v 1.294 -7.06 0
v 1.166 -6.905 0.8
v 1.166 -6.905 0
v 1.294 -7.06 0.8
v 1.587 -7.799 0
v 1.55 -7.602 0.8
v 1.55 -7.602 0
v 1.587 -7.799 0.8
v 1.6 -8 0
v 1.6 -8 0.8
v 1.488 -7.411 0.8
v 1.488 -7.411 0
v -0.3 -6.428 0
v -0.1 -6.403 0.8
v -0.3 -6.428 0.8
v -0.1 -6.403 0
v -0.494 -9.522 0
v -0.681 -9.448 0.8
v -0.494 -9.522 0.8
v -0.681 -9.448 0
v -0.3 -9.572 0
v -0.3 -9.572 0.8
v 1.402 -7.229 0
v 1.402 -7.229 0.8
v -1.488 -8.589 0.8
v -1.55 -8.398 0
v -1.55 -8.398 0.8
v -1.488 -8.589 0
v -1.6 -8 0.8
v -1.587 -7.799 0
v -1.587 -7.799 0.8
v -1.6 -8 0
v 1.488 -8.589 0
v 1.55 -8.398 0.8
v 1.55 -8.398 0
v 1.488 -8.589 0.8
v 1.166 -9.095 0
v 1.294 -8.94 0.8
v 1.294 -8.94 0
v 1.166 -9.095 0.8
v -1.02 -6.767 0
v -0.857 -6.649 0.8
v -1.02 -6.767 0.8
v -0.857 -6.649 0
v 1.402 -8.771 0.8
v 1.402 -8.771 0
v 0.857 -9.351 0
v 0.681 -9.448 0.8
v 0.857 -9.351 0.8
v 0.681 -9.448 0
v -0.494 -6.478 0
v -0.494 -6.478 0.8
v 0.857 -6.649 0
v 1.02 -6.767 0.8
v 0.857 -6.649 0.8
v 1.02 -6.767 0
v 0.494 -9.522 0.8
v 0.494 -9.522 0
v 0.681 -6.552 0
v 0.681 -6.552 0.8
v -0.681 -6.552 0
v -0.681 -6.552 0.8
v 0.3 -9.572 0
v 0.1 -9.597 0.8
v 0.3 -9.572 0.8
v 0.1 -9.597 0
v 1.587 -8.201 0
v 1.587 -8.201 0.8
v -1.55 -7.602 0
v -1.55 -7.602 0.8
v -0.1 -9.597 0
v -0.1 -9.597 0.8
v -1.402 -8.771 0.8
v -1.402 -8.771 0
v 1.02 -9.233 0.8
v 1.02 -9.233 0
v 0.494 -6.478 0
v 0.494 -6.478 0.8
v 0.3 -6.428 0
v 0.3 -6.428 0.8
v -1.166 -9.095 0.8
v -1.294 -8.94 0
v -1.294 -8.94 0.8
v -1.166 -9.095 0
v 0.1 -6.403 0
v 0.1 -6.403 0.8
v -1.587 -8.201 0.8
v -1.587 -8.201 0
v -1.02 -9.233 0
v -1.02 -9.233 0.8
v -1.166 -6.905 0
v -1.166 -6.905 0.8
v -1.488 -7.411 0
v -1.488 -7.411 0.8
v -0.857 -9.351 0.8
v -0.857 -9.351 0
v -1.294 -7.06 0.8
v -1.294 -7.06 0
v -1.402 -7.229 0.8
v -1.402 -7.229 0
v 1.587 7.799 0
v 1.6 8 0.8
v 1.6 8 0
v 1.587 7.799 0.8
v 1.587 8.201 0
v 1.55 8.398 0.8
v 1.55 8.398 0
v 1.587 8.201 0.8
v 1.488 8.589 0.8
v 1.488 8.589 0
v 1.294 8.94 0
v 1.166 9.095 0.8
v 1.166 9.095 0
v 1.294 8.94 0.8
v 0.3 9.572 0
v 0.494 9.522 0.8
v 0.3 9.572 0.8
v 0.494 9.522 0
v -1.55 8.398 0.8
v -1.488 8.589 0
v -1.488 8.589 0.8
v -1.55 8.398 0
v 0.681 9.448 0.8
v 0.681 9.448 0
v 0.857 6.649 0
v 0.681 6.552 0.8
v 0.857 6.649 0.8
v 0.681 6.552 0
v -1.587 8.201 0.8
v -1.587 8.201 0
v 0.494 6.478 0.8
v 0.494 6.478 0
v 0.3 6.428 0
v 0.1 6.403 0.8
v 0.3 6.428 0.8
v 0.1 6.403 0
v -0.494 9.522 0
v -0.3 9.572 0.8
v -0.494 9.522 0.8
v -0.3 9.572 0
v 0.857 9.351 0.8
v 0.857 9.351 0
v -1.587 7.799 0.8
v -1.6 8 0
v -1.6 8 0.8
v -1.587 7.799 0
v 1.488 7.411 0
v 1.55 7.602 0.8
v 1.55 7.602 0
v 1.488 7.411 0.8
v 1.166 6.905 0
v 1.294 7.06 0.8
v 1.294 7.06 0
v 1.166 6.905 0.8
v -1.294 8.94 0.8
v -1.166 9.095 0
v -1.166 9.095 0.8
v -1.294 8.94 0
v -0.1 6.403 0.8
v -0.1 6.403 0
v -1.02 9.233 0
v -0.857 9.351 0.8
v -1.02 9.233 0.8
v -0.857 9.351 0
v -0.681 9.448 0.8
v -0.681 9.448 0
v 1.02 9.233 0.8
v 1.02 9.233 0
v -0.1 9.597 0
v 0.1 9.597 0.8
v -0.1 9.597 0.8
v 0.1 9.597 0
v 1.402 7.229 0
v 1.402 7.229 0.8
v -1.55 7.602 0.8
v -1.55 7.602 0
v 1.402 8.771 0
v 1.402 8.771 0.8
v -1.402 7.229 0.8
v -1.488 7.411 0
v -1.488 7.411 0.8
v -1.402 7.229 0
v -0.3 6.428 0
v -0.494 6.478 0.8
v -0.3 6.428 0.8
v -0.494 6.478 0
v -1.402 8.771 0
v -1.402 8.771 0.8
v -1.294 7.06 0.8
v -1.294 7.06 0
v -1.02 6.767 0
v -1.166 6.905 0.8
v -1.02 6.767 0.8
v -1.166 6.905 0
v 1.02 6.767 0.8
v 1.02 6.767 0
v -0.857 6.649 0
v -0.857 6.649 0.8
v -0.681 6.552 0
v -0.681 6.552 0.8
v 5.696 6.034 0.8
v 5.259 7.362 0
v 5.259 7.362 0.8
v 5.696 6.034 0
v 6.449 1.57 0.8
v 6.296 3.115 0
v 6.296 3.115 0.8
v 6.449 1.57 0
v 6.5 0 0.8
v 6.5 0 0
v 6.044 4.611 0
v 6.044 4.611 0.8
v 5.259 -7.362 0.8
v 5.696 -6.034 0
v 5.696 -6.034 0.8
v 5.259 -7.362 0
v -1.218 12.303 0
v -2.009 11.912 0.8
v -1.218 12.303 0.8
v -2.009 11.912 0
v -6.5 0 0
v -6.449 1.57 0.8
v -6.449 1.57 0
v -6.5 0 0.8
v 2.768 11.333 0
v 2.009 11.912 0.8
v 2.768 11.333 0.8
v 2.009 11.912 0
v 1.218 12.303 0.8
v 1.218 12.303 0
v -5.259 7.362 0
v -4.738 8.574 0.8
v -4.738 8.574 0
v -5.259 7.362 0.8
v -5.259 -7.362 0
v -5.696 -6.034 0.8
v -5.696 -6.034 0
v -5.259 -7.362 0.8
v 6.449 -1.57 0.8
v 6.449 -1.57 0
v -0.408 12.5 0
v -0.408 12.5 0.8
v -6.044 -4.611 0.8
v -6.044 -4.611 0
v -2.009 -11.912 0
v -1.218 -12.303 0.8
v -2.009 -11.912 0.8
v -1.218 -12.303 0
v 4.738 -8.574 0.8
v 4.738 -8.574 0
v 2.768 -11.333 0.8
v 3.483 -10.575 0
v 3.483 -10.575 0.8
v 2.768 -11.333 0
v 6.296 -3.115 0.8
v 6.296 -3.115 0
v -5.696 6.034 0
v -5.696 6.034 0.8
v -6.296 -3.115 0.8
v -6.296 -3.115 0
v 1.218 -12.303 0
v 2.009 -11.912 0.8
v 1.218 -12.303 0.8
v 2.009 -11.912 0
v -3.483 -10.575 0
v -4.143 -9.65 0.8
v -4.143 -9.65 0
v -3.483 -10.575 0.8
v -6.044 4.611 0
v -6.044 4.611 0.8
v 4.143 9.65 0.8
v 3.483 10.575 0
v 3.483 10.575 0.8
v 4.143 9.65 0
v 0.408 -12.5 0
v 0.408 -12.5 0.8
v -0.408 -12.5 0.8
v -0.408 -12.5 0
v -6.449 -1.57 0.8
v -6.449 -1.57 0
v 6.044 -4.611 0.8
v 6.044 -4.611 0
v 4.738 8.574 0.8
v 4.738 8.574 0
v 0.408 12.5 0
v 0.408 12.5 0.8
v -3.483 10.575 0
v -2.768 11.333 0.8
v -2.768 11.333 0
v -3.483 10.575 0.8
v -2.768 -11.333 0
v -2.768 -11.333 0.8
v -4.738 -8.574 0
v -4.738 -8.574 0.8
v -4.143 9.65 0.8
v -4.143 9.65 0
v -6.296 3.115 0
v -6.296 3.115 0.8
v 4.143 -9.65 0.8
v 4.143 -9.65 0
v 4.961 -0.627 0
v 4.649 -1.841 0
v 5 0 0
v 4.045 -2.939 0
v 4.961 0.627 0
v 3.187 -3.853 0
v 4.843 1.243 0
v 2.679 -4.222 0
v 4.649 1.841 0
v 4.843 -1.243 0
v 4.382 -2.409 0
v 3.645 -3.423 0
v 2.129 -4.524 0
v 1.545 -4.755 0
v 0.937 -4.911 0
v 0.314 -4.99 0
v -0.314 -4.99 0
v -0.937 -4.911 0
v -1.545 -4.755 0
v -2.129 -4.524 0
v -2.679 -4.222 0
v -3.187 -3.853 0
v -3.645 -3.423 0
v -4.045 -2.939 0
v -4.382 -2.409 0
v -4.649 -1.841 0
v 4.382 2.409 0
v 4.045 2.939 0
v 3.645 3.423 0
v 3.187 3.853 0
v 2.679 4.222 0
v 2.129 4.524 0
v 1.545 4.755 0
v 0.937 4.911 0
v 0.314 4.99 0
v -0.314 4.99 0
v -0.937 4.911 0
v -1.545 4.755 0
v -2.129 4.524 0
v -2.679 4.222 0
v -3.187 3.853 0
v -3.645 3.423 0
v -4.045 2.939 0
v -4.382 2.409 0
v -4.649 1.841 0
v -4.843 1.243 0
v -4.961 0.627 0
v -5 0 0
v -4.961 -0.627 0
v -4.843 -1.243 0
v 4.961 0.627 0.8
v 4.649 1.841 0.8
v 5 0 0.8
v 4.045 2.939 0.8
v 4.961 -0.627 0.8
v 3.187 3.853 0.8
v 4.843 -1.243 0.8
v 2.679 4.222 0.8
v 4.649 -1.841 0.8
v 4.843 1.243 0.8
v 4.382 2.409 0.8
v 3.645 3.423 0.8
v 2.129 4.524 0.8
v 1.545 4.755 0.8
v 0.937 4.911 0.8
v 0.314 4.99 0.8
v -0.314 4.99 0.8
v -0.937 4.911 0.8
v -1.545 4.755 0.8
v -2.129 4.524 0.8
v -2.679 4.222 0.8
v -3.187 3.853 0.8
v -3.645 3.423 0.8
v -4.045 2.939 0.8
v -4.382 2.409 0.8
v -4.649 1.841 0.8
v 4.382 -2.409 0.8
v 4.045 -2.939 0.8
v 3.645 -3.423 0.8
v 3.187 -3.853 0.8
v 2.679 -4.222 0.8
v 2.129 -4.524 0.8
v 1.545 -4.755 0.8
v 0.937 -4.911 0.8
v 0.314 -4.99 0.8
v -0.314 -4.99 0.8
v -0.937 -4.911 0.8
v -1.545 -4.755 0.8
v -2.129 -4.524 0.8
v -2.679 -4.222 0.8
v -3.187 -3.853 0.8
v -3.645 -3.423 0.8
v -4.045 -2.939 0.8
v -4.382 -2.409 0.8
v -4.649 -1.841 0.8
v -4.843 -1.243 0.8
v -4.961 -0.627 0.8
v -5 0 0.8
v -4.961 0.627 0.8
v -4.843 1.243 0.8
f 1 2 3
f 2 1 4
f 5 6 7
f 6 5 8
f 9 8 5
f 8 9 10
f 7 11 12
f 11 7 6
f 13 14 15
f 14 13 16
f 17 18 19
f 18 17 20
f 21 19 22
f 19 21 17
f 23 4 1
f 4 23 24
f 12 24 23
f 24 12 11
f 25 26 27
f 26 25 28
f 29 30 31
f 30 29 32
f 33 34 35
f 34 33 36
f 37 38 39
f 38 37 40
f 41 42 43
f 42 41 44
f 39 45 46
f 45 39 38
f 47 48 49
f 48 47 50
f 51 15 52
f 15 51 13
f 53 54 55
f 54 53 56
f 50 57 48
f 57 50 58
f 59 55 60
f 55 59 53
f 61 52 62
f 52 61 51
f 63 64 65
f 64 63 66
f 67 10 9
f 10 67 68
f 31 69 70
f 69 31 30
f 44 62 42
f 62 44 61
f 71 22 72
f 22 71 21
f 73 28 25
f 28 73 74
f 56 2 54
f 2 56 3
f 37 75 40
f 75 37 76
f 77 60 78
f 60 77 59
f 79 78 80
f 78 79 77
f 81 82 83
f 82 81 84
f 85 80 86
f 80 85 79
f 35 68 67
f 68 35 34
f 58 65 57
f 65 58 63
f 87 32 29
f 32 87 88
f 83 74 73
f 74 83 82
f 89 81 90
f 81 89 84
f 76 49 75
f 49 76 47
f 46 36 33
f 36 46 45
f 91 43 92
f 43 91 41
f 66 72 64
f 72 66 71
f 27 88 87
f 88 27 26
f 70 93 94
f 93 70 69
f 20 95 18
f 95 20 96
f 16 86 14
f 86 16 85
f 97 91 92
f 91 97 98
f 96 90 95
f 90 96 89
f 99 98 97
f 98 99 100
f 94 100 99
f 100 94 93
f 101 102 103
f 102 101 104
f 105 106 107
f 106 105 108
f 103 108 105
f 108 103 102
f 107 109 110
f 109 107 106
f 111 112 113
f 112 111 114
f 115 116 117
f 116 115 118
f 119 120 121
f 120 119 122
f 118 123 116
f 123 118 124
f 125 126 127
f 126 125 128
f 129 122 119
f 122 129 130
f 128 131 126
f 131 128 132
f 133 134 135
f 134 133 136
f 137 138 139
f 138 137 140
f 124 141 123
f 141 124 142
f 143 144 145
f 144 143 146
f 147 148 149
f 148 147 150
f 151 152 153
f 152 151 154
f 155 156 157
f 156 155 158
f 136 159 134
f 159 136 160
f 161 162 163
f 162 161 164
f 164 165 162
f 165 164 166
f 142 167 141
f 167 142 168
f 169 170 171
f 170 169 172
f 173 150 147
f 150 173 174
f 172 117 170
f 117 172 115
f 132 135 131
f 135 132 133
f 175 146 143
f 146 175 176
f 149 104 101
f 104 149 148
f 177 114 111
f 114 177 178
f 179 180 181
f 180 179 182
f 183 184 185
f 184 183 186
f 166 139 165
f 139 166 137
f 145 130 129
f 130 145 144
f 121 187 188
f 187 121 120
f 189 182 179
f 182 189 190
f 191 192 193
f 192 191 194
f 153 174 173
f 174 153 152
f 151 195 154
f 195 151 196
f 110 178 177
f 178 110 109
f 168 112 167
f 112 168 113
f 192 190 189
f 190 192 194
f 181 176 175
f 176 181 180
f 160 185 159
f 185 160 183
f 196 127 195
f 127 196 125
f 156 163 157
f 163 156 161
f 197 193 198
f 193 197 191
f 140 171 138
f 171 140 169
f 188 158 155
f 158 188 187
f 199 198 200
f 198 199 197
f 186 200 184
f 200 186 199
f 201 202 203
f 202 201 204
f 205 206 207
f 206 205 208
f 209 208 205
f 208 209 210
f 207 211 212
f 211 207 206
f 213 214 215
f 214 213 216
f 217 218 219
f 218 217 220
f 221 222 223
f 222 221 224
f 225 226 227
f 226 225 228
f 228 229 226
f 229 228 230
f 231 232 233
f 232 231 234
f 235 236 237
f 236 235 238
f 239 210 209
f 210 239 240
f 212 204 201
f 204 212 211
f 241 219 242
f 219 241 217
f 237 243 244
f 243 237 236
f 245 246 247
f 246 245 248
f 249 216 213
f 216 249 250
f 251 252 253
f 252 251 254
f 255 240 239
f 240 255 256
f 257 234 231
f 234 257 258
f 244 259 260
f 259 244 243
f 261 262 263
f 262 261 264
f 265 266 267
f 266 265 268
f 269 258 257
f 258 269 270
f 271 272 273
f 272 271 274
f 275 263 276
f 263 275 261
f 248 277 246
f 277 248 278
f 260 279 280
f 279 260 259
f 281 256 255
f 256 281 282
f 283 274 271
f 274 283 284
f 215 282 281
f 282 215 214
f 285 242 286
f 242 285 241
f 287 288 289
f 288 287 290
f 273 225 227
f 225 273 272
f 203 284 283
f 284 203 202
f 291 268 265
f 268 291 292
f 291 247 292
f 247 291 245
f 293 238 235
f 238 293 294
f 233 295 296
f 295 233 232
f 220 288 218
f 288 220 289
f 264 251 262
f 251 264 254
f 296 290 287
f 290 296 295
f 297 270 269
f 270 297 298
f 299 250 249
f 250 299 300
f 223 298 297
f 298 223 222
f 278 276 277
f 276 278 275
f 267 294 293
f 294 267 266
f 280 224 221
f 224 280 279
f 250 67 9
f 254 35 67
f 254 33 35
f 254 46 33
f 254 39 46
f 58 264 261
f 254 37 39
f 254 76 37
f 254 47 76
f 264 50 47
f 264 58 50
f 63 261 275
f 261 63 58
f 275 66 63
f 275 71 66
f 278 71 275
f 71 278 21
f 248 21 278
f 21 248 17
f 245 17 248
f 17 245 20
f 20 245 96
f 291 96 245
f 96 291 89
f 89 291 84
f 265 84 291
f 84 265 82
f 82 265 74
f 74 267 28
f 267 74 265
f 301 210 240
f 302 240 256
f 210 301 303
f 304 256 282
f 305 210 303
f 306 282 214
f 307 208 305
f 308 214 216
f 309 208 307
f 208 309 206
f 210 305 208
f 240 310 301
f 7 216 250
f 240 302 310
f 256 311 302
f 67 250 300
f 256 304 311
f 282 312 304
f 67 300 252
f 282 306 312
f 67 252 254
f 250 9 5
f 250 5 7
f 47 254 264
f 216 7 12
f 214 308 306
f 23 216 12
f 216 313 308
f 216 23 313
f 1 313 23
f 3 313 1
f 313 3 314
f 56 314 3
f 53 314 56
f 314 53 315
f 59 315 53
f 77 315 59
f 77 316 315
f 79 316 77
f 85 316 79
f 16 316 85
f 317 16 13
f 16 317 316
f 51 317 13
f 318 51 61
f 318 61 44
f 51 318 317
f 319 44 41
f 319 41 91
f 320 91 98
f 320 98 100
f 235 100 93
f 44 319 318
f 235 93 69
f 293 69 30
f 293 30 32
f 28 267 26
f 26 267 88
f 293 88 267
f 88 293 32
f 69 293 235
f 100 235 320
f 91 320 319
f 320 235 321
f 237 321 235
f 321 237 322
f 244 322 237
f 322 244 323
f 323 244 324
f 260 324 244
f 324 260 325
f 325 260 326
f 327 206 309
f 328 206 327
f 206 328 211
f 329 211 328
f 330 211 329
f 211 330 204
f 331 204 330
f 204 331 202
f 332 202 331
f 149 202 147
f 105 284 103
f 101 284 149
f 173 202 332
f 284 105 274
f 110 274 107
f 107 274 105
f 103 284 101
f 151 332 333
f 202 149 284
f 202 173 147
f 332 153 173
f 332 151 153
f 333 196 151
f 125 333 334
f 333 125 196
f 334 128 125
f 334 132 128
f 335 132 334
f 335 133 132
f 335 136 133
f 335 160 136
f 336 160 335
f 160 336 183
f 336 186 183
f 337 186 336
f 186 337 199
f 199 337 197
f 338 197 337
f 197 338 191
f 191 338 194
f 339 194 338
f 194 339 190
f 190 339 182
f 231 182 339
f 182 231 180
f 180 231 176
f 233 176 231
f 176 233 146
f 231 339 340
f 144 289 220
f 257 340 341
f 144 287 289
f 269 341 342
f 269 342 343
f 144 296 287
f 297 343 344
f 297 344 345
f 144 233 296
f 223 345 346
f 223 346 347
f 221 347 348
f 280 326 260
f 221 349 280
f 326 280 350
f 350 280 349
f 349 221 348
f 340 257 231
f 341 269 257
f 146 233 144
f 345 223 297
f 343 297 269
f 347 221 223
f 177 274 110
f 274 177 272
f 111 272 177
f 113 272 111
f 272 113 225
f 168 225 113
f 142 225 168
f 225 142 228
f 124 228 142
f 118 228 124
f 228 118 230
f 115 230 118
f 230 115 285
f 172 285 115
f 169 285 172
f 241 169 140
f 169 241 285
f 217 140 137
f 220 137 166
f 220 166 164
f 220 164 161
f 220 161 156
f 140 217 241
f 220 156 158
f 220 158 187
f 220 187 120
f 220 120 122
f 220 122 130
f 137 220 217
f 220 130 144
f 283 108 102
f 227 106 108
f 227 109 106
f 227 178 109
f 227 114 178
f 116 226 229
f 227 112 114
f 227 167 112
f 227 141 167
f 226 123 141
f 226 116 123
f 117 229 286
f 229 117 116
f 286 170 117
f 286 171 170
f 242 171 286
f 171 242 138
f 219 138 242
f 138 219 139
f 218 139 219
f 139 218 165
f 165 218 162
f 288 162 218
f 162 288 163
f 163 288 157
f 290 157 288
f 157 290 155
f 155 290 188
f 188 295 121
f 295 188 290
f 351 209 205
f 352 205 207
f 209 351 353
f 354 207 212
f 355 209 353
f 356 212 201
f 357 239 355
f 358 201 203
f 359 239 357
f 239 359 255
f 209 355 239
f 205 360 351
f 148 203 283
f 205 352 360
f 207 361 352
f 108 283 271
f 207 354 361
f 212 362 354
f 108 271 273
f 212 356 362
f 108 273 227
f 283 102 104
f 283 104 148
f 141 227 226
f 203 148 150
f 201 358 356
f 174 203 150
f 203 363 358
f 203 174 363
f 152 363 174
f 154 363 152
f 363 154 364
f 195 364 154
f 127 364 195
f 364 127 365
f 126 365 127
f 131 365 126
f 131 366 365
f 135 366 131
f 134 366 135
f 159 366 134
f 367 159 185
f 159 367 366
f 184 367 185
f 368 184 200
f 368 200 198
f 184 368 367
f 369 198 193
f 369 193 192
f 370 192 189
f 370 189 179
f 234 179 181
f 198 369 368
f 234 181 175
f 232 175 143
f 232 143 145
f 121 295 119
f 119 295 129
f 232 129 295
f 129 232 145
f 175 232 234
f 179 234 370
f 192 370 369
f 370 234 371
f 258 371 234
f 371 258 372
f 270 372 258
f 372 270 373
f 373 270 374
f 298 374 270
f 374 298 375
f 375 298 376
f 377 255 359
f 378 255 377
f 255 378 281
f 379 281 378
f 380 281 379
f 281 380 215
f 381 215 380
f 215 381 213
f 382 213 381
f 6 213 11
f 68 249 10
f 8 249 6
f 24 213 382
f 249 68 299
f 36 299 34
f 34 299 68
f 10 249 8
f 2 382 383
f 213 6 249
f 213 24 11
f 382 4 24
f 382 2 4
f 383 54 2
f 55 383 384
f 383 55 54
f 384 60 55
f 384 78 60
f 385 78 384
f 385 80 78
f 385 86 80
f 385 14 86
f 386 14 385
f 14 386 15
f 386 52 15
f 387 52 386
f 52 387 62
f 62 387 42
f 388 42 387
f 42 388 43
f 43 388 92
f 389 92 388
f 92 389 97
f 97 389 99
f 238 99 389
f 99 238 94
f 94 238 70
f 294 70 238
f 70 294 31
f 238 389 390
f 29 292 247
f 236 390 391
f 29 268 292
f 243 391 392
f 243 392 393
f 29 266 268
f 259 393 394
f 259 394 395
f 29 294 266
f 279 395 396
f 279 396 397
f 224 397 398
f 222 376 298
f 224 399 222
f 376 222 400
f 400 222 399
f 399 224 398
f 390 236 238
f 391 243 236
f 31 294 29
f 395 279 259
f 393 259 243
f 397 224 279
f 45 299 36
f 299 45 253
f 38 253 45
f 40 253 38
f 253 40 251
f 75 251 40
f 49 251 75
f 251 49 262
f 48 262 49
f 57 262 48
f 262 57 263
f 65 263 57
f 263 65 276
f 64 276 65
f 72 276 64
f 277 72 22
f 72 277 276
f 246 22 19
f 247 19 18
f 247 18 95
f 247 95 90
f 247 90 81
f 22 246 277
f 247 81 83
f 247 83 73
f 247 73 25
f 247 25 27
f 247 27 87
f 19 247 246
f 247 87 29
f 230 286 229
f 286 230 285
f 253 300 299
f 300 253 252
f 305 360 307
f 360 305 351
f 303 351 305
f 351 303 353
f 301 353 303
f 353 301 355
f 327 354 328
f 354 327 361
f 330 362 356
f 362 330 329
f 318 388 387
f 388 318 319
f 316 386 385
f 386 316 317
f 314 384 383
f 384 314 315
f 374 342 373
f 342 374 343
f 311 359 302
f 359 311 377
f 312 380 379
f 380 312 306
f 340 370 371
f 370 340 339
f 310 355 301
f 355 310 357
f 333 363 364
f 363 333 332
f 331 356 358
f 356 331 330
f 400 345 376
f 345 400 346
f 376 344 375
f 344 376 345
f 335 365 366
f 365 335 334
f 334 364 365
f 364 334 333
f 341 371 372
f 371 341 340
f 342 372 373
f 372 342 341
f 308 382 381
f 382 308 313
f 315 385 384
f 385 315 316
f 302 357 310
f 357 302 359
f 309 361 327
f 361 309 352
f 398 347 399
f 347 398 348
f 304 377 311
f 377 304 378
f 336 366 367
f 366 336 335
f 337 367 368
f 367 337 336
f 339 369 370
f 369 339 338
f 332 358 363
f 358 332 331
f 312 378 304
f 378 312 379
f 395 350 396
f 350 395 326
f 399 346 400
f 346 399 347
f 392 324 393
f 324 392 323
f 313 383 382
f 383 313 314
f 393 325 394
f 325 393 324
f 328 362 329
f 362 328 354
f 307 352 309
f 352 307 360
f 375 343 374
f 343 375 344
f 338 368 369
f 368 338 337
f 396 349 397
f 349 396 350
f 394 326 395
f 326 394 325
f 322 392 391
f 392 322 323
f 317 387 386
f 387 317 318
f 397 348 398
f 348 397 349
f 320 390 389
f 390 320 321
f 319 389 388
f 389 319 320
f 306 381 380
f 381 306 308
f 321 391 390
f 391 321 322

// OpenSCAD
$fn = 50;
difference() {
    resize([13, 25]) cylinder(0.8, d=1);
    for (i = [-1, 1]) {
        translate([0, 8*i, 0]) cylinder(10, d = 3.2, center=true);
    }
    cylinder(10, d = 10, center=true);
}
